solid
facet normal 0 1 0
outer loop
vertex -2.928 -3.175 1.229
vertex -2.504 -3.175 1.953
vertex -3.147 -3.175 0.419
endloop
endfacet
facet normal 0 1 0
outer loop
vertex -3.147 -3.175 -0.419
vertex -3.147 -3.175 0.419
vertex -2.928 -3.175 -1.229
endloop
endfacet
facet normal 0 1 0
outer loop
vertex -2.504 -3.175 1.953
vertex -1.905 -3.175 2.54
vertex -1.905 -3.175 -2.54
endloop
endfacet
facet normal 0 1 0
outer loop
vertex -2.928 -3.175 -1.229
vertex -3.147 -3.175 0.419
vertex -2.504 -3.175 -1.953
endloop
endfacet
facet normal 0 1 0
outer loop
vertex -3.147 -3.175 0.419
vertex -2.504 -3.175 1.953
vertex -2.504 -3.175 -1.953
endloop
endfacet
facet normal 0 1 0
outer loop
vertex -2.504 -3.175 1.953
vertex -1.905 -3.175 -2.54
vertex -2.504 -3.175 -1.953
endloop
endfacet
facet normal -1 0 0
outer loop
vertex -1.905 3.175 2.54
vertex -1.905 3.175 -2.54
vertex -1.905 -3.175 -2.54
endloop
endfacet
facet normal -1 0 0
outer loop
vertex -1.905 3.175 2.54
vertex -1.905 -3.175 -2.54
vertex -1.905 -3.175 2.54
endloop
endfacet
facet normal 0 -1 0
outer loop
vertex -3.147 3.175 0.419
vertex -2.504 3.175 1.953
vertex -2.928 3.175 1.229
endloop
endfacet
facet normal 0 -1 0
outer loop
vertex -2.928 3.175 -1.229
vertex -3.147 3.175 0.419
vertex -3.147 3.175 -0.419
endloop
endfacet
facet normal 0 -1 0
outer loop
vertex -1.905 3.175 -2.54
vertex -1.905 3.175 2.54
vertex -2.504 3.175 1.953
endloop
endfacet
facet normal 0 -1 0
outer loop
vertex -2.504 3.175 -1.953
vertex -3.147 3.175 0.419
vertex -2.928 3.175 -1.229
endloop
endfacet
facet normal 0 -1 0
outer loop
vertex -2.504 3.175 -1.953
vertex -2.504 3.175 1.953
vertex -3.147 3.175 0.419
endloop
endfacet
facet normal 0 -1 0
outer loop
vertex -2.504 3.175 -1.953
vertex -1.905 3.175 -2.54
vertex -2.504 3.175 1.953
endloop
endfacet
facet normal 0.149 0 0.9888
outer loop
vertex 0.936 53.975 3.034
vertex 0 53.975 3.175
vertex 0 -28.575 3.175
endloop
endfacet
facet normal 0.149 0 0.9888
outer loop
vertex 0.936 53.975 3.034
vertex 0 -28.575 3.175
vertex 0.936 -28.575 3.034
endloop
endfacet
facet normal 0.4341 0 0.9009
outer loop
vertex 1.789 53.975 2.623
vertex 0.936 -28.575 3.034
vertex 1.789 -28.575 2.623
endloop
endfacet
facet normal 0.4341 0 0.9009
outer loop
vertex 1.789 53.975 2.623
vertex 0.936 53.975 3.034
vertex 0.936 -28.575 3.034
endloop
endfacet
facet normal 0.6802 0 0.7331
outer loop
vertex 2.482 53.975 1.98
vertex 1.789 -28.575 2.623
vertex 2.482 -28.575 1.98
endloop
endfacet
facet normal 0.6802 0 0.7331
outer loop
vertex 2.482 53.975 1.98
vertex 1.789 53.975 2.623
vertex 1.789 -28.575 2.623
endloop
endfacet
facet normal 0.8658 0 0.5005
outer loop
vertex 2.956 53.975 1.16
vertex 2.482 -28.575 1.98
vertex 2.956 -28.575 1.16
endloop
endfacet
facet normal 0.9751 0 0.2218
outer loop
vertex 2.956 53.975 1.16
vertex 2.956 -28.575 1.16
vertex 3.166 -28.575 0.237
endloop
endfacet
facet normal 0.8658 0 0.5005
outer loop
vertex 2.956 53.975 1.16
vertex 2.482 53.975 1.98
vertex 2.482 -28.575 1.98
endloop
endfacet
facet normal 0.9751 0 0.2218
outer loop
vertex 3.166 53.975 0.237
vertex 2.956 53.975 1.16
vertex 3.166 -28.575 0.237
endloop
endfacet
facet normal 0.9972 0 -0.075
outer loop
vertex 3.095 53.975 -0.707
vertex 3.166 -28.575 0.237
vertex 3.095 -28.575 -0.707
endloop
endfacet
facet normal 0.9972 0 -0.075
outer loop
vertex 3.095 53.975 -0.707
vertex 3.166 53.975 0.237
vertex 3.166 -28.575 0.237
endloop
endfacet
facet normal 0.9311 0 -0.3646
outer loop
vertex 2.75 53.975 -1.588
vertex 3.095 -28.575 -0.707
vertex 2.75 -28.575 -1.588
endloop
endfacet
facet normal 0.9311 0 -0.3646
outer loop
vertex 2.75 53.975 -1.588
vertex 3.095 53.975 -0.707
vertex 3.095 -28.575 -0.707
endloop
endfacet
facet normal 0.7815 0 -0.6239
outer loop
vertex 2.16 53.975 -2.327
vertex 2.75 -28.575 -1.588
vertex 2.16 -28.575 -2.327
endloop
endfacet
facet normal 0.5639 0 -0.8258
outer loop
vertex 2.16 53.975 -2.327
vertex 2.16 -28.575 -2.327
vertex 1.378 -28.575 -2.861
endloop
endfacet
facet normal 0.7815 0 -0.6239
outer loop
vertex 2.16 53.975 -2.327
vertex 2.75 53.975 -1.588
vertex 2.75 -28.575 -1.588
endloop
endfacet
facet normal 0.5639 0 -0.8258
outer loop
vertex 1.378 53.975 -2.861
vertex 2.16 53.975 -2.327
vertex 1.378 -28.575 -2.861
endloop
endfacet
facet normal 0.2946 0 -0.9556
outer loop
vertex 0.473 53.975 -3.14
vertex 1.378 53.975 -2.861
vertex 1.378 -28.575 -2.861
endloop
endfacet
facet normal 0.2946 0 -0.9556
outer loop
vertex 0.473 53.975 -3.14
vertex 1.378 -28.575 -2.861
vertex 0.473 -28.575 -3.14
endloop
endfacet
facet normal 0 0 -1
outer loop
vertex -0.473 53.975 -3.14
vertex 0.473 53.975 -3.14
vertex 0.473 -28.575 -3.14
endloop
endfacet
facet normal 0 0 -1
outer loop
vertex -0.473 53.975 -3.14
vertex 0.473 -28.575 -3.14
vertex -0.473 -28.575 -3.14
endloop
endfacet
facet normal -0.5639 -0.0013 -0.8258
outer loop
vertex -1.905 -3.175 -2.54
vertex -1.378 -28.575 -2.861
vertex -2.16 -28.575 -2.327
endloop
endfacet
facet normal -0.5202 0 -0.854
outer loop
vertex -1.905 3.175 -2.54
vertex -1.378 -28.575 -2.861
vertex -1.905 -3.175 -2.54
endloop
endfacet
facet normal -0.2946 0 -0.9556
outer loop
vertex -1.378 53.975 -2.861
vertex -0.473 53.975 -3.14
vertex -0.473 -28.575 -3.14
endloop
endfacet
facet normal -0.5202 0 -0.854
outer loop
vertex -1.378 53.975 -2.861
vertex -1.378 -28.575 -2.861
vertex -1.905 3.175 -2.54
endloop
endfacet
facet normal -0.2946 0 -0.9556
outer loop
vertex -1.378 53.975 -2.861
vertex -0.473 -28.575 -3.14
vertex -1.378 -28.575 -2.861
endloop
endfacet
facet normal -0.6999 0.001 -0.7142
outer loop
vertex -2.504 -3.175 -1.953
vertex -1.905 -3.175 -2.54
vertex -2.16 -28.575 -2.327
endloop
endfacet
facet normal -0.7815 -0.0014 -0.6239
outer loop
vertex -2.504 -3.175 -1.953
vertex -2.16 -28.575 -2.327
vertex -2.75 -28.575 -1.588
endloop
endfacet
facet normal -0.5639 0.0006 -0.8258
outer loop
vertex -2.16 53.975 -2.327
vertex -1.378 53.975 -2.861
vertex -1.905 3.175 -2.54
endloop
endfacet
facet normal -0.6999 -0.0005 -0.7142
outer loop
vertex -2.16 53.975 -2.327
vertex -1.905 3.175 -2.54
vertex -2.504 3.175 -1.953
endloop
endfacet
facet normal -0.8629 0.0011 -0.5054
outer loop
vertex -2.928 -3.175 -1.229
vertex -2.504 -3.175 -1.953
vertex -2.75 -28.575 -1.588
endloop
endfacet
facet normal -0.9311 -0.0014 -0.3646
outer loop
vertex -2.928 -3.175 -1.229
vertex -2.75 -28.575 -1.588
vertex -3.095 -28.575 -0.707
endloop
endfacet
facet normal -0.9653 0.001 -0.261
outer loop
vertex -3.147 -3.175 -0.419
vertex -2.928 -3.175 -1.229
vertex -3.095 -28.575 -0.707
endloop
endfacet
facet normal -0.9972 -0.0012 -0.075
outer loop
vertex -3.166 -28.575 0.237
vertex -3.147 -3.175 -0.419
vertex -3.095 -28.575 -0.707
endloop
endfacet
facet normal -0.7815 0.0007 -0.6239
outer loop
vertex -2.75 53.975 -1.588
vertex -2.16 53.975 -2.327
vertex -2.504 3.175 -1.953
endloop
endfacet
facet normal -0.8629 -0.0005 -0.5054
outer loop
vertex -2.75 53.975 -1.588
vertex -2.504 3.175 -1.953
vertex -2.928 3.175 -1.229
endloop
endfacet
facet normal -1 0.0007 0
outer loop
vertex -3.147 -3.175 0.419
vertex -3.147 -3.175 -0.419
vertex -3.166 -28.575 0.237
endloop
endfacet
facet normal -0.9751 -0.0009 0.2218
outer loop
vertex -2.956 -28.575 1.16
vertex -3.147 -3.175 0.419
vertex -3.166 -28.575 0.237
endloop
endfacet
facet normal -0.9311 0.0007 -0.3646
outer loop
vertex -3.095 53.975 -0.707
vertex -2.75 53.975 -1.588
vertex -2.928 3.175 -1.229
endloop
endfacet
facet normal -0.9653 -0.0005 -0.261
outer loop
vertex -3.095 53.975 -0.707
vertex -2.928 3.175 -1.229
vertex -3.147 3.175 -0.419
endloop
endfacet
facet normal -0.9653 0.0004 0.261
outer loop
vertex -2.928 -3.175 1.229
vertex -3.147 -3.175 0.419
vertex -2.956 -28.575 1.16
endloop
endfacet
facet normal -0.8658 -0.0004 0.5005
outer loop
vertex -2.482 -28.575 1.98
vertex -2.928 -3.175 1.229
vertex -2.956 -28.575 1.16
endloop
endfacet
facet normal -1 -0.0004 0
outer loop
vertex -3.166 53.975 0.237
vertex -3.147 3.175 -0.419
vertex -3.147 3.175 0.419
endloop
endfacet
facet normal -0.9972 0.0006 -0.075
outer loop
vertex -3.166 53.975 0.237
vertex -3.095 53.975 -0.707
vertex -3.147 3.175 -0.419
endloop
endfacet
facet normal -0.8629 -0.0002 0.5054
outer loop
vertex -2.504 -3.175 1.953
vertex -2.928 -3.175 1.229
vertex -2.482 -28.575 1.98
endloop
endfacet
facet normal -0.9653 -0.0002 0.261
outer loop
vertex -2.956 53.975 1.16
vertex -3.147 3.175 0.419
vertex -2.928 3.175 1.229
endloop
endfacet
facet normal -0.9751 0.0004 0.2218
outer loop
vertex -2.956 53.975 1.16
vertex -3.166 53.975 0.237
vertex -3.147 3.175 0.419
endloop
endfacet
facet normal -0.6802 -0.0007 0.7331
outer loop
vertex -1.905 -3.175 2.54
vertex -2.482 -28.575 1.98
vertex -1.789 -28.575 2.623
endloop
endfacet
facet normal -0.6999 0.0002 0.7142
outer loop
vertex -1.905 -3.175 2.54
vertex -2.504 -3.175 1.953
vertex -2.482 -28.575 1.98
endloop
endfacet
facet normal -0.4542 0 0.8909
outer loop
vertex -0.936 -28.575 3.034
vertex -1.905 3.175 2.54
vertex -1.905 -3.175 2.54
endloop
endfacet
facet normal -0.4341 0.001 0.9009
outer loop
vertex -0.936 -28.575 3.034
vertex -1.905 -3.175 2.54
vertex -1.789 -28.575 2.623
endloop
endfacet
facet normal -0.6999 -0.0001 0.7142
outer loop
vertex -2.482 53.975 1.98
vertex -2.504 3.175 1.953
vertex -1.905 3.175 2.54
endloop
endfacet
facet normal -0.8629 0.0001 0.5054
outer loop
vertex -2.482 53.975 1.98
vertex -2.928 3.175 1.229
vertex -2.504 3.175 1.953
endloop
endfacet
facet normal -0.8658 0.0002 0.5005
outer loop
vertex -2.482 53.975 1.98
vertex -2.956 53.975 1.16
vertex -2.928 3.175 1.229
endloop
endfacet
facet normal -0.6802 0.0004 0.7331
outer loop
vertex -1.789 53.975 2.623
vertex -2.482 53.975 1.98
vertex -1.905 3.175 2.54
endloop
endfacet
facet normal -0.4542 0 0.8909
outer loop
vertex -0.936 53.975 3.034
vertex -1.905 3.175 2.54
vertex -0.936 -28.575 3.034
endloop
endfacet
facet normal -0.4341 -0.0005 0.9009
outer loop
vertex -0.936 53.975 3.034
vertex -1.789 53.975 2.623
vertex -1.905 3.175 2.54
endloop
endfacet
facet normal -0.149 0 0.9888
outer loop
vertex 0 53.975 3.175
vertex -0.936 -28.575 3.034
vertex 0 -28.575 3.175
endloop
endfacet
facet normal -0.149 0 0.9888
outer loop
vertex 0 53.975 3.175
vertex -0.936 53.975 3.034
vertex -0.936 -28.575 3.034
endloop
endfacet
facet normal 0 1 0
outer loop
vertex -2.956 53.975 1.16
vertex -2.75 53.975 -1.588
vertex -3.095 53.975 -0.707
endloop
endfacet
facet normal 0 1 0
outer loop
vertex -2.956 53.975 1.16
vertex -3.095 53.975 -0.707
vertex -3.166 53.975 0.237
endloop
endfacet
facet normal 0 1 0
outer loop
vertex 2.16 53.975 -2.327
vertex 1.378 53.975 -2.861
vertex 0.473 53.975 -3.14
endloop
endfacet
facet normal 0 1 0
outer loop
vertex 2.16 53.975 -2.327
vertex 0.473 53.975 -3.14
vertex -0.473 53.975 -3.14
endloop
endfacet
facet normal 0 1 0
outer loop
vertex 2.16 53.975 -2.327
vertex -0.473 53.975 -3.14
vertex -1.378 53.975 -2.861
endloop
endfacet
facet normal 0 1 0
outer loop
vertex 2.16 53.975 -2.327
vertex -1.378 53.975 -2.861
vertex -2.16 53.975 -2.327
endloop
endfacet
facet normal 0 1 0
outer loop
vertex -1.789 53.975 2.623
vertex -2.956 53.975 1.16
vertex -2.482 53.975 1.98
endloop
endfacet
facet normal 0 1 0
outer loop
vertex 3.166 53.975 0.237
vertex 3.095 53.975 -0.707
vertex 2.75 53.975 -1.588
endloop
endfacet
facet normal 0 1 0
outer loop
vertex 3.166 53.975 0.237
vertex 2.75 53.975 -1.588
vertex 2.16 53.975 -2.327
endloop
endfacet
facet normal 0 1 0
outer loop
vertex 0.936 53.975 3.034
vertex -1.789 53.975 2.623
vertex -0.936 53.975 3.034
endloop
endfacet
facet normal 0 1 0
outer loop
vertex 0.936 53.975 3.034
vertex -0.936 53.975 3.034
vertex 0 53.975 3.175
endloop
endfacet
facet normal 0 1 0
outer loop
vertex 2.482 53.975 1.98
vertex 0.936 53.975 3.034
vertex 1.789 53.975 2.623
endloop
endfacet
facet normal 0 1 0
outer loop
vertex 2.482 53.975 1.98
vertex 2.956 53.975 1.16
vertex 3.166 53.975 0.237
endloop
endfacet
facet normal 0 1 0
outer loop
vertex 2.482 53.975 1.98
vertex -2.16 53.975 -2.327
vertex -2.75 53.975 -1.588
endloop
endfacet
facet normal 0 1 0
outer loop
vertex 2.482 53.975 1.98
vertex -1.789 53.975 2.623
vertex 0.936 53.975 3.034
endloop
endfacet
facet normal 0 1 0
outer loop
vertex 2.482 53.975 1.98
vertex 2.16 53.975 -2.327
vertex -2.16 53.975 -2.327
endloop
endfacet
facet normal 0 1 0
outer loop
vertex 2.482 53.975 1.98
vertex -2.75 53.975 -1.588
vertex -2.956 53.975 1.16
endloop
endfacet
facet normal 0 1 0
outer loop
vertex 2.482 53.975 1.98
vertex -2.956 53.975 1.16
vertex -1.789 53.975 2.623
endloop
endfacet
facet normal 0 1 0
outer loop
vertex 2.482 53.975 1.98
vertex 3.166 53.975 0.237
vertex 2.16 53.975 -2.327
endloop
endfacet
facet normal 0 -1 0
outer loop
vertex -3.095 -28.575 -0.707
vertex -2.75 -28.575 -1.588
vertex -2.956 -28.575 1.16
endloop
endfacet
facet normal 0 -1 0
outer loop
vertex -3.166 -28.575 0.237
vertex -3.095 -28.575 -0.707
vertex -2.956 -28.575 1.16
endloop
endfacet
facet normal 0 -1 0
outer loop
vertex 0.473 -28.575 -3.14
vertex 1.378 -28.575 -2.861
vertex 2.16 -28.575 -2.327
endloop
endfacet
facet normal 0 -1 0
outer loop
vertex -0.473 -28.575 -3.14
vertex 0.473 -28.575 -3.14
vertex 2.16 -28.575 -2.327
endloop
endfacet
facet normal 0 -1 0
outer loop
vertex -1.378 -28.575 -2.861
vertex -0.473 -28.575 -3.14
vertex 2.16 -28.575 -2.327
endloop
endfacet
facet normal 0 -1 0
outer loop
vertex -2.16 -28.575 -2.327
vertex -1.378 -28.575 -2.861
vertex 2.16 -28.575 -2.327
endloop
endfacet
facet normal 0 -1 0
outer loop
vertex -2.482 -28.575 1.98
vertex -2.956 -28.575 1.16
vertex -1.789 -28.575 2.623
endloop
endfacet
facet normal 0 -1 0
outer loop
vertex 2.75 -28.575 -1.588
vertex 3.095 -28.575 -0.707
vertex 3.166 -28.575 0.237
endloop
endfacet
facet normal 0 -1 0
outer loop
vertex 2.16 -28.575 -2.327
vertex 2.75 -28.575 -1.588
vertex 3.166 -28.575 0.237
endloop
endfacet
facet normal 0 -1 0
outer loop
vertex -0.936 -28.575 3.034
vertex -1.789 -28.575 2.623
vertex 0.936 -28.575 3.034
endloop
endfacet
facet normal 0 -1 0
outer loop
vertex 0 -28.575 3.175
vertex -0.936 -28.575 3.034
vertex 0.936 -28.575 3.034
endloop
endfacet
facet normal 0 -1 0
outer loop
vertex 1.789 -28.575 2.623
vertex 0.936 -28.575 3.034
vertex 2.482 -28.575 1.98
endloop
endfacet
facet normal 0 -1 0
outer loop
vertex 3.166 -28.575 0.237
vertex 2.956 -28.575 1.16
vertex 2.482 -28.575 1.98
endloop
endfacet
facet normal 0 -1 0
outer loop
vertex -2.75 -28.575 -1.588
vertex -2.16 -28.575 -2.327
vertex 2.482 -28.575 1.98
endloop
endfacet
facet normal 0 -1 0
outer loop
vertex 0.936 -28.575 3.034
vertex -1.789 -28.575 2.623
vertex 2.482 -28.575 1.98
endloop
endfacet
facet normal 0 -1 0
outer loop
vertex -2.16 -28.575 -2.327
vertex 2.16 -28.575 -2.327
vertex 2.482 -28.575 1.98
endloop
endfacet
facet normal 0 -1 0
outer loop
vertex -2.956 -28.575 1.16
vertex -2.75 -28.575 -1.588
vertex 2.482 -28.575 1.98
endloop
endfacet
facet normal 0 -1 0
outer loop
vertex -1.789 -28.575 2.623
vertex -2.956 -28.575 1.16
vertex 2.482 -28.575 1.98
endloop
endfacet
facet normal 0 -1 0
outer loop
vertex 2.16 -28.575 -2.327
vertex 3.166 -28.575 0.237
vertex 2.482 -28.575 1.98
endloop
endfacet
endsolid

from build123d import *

# Parameters (mm, degrees)
SKETCH1_R           = 3.175
BOSS_EXTRUDE1_DEPTH = 28.575
CUT_EXTRUDE1_START  = -28.575
CUT_EXTRUDE1_DEPTH  = 3.175
BOSS_EXTRUDE2_START = 25.4
SKETCH3_R           = 3.175
BOSS_EXTRUDE2_DEPTH = 25.4


with BuildPart() as part:
    # Sketch1 → Boss-Extrude1 (new, symmetric)
    with BuildSketch(Plane(origin=(0, 0, 0), x_dir=(1, 0, 0), z_dir=(0, 1, 0))):
        with Locations(Location((0, 0, 0), (0, 0, 270))):
            Circle(SKETCH1_R)
    extrude(amount=BOSS_EXTRUDE1_DEPTH, both=True)

    # Sketch2 → Cut-Extrude1 (cut, symmetric)
    with BuildSketch(Plane(origin=(0, 28.575, 0), x_dir=(1, 0, 0), z_dir=(0, 1, 0)).offset(CUT_EXTRUDE1_START)):
        with BuildLine():
            Line((-1.905, 2.54), (-1.905, -2.54))
            ThreePointArc((-1.905, -2.54), (-3.175, 0), (-1.905, 2.54))
        make_face()
    extrude(amount=CUT_EXTRUDE1_DEPTH, both=True, mode=Mode.SUBTRACT)

    # Sketch3 → Boss-Extrude2 (add)
    with BuildSketch(Plane(origin=(0, 28.575, 0), x_dir=(1, 0, 0), z_dir=(0, 1, 0)).offset(BOSS_EXTRUDE2_START)):
        with Locations(Location((0, 0, 0), (0, 0, 270))):
            Circle(SKETCH3_R)
    extrude(amount=-BOSS_EXTRUDE2_DEPTH)


solid = part.part
